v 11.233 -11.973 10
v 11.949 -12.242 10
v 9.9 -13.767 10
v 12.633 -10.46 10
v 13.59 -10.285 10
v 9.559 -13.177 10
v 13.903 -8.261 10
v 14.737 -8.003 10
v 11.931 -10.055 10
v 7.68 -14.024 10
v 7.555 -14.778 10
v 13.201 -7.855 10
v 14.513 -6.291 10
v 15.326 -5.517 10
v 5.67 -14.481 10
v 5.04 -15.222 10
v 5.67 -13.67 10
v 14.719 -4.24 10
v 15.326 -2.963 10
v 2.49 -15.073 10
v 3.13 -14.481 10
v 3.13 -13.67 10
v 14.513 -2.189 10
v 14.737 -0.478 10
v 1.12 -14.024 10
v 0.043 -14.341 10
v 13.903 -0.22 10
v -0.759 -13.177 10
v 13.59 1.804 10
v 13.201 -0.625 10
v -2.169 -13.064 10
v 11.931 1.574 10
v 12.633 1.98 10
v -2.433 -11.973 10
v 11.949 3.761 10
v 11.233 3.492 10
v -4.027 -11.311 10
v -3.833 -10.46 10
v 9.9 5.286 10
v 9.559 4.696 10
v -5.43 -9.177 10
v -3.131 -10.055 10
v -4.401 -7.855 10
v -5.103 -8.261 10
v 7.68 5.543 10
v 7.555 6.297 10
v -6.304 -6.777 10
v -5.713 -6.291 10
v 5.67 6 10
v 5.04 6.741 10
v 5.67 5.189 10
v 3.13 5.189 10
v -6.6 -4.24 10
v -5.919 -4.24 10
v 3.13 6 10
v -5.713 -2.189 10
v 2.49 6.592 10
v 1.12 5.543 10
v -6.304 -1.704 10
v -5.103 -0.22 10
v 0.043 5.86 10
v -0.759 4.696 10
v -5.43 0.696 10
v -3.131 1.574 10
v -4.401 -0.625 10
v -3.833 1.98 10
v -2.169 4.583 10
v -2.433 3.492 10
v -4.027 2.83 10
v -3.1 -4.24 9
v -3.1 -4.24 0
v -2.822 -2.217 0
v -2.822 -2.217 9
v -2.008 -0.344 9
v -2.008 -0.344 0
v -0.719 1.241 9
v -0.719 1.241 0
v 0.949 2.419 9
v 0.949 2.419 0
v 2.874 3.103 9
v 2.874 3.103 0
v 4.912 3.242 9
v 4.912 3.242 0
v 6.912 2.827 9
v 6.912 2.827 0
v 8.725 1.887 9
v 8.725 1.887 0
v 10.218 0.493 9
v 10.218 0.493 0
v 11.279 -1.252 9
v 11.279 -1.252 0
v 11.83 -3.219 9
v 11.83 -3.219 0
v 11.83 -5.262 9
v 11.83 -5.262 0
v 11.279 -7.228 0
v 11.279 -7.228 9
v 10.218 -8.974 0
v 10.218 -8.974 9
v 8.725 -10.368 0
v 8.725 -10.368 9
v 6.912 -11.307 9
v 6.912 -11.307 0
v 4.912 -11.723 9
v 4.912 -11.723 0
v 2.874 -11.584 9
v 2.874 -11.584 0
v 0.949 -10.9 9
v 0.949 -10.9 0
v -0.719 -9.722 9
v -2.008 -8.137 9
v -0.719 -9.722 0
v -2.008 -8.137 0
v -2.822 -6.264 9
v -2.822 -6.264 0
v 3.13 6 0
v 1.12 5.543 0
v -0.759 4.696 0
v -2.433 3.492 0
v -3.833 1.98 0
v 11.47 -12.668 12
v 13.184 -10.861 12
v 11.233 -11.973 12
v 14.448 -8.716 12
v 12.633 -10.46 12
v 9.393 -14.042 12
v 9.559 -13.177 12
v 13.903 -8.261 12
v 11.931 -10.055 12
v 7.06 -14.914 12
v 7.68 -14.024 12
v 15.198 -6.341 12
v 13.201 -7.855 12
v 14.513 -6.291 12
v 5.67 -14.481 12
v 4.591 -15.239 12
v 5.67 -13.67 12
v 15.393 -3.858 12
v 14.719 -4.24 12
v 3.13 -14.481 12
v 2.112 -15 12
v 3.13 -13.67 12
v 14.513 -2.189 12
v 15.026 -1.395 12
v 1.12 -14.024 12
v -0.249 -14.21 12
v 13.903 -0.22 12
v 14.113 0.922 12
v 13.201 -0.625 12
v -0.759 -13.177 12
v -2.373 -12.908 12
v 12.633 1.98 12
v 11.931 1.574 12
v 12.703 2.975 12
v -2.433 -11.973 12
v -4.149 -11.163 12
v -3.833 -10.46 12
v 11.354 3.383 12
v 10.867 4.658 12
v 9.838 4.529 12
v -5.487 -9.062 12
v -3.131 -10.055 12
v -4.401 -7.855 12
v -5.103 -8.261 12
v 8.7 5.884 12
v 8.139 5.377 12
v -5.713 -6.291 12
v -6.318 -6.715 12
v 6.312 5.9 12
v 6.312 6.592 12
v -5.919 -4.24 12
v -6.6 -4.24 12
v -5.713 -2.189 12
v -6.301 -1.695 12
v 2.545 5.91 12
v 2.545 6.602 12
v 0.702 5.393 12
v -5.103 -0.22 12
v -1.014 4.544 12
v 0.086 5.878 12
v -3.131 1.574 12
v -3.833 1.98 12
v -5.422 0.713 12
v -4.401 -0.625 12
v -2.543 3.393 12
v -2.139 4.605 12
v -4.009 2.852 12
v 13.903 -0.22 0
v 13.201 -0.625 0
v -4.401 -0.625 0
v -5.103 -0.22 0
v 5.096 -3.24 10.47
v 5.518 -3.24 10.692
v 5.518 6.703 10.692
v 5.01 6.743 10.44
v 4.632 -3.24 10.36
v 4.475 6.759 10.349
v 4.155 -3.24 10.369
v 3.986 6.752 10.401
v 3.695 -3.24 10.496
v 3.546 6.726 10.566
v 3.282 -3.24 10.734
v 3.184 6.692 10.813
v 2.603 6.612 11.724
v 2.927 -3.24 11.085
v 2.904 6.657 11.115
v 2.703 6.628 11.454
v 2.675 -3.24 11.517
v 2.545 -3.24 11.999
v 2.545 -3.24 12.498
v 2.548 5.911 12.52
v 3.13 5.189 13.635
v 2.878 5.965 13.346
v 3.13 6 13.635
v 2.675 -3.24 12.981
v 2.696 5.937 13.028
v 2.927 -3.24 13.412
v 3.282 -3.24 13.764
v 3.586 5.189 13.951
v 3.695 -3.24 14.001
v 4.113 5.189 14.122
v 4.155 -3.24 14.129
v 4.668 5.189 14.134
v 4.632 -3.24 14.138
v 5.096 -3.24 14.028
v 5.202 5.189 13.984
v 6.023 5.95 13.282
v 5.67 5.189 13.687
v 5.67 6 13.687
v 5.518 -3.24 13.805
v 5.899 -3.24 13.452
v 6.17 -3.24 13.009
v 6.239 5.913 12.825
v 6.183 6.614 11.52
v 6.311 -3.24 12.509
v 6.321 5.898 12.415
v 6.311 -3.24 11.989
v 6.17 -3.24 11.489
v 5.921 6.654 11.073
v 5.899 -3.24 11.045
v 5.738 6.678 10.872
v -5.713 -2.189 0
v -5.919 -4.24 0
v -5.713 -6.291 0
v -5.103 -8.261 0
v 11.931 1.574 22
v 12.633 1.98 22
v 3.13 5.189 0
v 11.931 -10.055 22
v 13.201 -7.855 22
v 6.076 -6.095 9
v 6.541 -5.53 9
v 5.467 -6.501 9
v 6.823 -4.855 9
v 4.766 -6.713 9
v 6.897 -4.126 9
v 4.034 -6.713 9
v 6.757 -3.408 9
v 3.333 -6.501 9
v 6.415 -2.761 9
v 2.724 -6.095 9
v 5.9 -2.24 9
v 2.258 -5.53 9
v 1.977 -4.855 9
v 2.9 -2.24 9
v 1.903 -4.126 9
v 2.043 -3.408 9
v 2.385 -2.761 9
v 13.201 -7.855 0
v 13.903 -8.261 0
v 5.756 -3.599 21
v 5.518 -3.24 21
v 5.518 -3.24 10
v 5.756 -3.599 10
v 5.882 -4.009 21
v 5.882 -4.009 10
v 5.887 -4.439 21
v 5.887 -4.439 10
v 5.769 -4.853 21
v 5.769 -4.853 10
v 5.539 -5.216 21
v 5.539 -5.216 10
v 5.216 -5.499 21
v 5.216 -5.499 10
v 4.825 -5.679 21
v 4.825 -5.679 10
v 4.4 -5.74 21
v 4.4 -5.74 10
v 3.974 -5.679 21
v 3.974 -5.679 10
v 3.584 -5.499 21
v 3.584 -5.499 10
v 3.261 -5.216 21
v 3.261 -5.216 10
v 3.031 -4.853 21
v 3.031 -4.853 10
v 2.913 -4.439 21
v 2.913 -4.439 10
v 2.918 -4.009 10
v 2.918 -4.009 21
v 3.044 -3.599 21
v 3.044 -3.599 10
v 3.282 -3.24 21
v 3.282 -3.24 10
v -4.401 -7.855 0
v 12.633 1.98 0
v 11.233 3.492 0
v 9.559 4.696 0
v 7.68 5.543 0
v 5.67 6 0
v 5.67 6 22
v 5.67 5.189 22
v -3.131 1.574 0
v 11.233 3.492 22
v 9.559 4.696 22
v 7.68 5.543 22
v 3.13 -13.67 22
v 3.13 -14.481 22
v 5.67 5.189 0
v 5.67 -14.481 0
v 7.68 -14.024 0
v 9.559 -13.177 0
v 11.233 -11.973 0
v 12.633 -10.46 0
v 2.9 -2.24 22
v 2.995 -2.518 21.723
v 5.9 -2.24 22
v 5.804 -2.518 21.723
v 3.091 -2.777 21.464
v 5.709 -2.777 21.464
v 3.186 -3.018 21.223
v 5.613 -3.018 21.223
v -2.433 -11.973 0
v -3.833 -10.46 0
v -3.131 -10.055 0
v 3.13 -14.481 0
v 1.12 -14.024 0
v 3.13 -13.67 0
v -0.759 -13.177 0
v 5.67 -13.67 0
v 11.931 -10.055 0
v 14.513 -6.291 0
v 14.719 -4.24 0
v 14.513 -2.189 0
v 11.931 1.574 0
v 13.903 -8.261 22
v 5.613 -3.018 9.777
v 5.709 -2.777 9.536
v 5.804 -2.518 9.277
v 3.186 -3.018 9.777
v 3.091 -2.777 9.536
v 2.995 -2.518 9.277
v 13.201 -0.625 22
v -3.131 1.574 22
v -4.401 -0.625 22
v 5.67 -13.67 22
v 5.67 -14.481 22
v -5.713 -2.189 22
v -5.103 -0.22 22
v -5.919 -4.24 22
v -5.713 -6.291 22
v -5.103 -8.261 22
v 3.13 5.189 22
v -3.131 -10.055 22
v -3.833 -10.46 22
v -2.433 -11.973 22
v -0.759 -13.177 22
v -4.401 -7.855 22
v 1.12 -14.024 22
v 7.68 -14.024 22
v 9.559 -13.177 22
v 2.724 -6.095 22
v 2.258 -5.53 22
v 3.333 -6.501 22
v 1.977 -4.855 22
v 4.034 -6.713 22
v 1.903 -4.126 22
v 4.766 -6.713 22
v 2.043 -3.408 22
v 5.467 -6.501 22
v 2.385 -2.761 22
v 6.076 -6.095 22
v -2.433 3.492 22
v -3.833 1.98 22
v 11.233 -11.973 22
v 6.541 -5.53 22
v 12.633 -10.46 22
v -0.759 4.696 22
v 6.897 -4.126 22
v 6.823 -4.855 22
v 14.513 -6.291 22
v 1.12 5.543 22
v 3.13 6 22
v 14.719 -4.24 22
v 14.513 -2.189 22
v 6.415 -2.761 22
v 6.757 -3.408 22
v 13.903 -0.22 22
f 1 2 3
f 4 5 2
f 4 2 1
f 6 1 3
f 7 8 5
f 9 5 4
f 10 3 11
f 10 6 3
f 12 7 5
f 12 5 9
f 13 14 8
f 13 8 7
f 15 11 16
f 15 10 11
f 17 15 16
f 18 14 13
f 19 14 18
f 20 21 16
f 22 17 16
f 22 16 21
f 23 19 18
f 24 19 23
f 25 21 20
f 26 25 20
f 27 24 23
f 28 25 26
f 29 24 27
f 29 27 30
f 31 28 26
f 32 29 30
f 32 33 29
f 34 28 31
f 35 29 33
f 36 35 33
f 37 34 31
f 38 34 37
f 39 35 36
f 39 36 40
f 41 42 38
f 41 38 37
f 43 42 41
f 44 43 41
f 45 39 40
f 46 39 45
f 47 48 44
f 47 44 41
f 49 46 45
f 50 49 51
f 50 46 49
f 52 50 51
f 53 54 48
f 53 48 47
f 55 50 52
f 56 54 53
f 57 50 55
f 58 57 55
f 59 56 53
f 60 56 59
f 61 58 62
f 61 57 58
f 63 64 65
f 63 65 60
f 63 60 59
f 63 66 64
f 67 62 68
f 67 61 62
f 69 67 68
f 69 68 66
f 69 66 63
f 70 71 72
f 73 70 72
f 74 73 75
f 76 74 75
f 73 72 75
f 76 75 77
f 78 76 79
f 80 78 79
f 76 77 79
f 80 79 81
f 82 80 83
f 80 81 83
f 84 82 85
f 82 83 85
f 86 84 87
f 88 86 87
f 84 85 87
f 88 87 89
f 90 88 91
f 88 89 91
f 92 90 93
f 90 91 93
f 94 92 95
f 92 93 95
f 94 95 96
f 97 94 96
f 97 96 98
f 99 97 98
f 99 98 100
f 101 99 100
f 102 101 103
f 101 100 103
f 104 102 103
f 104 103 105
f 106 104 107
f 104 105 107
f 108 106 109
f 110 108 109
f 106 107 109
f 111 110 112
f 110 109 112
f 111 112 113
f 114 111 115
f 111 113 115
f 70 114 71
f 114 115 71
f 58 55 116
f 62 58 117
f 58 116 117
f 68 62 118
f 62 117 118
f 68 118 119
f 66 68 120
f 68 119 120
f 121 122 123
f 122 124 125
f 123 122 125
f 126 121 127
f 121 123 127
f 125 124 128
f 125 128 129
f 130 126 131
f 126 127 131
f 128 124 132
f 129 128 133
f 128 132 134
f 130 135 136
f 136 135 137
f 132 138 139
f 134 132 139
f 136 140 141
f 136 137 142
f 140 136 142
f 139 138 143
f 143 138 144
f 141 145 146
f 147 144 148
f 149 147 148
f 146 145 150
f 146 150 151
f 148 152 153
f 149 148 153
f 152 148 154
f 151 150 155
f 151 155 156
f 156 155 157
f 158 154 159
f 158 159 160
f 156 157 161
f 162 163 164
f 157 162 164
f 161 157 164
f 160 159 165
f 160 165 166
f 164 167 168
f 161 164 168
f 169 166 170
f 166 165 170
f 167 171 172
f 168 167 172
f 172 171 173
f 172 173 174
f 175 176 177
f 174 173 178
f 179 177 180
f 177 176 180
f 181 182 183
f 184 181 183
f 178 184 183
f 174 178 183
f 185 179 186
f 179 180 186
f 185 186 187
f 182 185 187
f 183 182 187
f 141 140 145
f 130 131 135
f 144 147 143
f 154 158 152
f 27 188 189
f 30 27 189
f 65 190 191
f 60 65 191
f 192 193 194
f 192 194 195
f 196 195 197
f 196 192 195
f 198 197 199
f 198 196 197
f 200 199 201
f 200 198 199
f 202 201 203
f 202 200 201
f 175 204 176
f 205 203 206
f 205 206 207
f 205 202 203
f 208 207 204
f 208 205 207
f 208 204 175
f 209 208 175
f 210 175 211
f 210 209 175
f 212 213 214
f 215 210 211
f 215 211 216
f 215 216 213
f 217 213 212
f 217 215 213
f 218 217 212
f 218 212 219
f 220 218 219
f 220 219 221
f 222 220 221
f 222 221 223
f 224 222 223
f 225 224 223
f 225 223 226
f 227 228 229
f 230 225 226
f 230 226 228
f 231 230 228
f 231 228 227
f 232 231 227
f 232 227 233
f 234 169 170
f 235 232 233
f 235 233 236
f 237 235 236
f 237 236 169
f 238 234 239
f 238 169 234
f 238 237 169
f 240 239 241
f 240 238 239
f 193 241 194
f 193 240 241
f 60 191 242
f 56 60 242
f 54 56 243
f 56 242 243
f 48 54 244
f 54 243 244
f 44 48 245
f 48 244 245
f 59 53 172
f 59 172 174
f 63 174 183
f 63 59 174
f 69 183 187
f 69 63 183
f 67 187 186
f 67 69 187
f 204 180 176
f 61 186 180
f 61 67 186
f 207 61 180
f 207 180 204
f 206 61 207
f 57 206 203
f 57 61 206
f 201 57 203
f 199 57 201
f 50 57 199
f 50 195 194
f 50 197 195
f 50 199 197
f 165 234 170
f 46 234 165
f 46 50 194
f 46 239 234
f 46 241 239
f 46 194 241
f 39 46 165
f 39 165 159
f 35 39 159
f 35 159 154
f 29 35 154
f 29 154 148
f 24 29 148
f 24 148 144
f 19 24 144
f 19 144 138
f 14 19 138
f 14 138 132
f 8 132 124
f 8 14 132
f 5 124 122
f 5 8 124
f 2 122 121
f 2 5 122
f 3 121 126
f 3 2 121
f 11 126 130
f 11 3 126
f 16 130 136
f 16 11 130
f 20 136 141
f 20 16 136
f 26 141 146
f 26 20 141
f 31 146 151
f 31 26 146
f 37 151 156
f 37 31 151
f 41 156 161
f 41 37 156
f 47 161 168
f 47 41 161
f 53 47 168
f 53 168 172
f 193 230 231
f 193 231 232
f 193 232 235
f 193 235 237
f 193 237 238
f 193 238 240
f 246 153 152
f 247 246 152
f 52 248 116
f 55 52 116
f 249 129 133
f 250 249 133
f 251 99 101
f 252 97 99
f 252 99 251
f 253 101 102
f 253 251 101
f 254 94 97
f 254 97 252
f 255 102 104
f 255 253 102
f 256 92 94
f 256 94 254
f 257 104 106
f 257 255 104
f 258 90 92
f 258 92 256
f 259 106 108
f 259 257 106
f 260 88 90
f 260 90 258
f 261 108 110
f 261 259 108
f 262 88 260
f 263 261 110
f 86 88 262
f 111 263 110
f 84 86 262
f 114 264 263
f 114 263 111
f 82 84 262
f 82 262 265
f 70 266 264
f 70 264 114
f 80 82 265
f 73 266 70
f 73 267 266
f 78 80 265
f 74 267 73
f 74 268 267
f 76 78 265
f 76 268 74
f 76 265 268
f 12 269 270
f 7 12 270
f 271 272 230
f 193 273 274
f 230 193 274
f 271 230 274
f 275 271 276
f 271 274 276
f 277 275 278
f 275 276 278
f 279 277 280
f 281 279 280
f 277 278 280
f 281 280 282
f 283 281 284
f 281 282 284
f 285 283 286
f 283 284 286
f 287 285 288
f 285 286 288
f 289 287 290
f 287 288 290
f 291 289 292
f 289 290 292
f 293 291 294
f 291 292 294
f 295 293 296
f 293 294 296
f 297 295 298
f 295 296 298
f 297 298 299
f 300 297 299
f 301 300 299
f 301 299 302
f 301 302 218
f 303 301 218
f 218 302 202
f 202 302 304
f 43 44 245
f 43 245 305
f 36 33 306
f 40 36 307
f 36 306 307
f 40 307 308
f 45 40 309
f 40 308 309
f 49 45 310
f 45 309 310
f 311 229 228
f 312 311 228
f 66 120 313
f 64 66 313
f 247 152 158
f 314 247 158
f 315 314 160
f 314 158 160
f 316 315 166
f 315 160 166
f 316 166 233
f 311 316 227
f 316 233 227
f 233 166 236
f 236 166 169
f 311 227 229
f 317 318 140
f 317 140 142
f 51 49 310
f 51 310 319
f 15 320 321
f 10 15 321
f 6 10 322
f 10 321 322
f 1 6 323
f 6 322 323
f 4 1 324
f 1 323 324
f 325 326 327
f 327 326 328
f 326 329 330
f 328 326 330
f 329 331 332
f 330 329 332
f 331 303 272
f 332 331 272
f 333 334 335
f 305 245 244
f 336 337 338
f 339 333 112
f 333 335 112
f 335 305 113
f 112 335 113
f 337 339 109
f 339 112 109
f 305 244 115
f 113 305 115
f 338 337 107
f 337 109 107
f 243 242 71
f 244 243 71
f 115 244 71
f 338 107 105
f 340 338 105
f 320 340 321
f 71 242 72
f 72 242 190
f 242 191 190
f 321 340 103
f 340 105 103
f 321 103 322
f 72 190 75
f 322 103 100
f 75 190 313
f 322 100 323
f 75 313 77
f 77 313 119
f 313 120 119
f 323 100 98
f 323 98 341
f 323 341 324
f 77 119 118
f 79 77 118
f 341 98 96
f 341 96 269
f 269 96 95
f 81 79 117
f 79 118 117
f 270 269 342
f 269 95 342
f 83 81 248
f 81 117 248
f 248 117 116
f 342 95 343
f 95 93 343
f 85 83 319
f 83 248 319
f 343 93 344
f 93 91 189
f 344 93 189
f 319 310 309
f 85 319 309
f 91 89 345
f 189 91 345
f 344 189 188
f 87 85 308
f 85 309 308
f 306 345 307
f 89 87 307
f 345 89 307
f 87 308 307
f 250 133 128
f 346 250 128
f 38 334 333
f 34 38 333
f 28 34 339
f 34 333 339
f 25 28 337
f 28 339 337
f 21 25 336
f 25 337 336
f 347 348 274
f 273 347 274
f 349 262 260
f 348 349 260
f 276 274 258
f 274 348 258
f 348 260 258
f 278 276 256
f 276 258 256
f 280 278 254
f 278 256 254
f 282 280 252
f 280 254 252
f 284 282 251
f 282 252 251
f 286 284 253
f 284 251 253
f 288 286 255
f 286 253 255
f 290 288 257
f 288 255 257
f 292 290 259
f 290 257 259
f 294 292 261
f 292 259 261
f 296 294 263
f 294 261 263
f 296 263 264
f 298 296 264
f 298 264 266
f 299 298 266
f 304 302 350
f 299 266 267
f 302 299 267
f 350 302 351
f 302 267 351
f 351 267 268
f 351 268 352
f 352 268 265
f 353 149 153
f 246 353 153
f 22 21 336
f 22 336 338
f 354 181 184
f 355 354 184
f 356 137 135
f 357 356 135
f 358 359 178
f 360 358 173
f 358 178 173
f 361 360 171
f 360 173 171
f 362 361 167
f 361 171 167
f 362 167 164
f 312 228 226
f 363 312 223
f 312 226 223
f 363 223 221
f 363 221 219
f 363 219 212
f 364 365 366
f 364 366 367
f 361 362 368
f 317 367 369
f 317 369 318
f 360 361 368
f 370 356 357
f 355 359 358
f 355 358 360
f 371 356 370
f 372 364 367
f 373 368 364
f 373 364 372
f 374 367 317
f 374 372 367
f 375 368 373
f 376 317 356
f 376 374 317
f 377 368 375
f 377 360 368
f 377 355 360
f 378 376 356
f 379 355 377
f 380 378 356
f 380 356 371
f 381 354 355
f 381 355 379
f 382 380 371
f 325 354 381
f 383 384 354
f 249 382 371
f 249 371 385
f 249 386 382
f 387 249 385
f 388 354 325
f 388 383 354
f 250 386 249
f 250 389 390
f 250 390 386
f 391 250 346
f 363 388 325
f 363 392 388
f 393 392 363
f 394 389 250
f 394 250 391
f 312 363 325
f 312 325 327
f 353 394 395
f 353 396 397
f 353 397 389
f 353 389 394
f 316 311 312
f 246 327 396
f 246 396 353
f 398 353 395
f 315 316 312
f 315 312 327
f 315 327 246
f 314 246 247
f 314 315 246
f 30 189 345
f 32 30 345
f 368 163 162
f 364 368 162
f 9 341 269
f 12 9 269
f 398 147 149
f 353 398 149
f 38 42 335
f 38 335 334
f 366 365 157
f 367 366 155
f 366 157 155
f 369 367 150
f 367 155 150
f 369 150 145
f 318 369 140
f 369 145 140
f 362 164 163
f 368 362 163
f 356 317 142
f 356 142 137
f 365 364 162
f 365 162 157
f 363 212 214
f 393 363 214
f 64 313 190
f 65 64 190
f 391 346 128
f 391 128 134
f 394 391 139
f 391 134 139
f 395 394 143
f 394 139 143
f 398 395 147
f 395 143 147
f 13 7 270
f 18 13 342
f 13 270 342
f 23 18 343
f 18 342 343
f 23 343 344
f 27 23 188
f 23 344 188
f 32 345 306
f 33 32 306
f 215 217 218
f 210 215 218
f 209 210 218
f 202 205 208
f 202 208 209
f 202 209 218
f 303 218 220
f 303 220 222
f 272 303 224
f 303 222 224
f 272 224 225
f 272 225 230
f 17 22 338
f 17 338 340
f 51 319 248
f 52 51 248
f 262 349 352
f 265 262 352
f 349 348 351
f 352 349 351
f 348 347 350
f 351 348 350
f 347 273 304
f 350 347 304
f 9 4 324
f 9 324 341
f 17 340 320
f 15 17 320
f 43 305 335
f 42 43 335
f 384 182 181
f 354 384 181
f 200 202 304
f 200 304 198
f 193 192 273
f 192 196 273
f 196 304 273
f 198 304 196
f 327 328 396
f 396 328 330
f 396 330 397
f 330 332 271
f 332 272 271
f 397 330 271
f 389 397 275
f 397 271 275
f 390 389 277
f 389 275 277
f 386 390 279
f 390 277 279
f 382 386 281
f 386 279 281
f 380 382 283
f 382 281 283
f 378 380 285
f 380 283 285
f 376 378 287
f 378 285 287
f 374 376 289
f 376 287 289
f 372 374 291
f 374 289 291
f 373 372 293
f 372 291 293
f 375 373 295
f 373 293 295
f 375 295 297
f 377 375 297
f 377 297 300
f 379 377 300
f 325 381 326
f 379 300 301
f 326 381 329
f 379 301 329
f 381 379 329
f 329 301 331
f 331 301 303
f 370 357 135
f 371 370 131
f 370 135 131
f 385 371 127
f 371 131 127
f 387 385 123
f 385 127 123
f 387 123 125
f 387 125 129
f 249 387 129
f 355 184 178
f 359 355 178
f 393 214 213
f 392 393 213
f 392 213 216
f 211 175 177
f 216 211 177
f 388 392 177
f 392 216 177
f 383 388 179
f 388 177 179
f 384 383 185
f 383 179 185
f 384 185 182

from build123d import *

# Parameters (mm, degrees)
EXTRUDE_1_DEPTH          = 22
SKETCH_2_R               = 7.5
CUT_EXTRUDE_1_DEPTH      = 9
CUT_EXTRUDE_3_DEPTH      = 1
CUT_EXTRUDE_3_DEPTH_BACK = 8.42975
SKETCH_4_R               = 1.9
CHAMFER_1_SIZE           = 1
EXTRUDE_START            = -10
SKETCH_5_R               = 11
SKETCH_5_R_2             = 9.429749991
EXTRUDE_2_DEPTH          = 2
CUT_EXTRUDE_4_DEPTH      = 2
CUT_EXTRUDE_4_DEPTH_BACK = 2
SKETCH_6_R               = 1.9


with BuildPart() as part:
    # Эскиз1 → Бобышка-Вытянуть1 (new body)
    with BuildSketch(Plane.XY):
        with BuildLine():
            Line((13.201310027, -7.85542296), (13.90326512, -8.260696921))
            ThreePointArc((13.90326512, -8.260696921), (14.718656981, -4.240400213), (13.903265122, -0.220103504))
            Line((13.903265122, -0.220103504), (13.201310027, -0.625377467))
            Line((13.201310027, -0.625377467), (11.931310033, 1.574327047))
            Line((11.931310033, 1.574327047), (12.633265127, 1.979601009))
            ThreePointArc((12.633265127, 1.979601009), (9.559281984, 4.695899416), (5.669906988, 5.999897702))
            Line((5.669906988, 5.999897702), (5.669906988, 5.189349779))
            Line((5.669906988, 5.189349779), (3.129906988, 5.189349779))
            Line((3.129906988, 5.189349779), (3.129906988, 5.999897708))
            ThreePointArc((3.129906988, 5.999897708), (-0.759468012, 4.69589942), (-3.833451156, 1.979601011))
            Line((-3.833451156, 1.979601011), (-3.131496059, 1.574327046))
            Line((-3.131496059, 1.574327046), (-4.401496055, -0.625377472))
            Line((-4.401496055, -0.625377472), (-5.103451147, -0.22010351))
            ThreePointArc((-5.103451147, -0.22010351), (-5.918843009, -4.240400218), (-5.10345115, -8.260696926))
            Line((-5.10345115, -8.260696926), (-4.401496056, -7.855422963))
            Line((-4.401496056, -7.855422963), (-3.13149606, -10.055127481))
            Line((-3.13149606, -10.055127481), (-3.833451154, -10.460401444))
            ThreePointArc((-3.833451154, -10.460401444), (-0.759468012, -13.17669985), (3.129906983, -14.480698136))
            Line((3.129906983, -14.480698136), (3.129906983, -13.670150213))
            Line((3.129906983, -13.670150213), (5.669906983, -13.670150213))
            Line((5.669906983, -13.670150213), (5.669906983, -14.480698142))
            ThreePointArc((5.669906983, -14.480698142), (9.559281984, -13.176699854), (12.633265129, -10.460401443))
            Line((12.633265129, -10.460401443), (11.931310031, -10.055127478))
            Line((11.931310031, -10.055127478), (13.201310027, -7.85542296))
        make_face()
        with BuildLine():
            Line((3.281873001, -3.240400222), (5.517940979, -3.240400222))
            ThreePointArc((5.517940979, -3.240400222), (4.39990699, -5.740400222), (3.281873001, -3.240400222))
        make_face(mode=Mode.SUBTRACT)
    extrude(amount=EXTRUDE_1_DEPTH)

    # Эскиз2 → Вырез-Вытянуть1 (cut)
    with BuildSketch(Plane(origin=(0, 0, 0), x_dir=(-1, 0, 0), z_dir=(0, 0, -1))):
        with Locations((-4.39990699, -4.240400222)):
            Circle(SKETCH_2_R)
    extrude(amount=-CUT_EXTRUDE_1_DEPTH, mode=Mode.SUBTRACT)

    # Эскиз4 → Вырез-Вытянуть3 (cut, two sides: drawn at the far end of the back side and taken through both)
    with BuildSketch(Plane(origin=(0, 5.189349779, 0), x_dir=(1, 0, 0), z_dir=(0, 1, 0)).offset(-CUT_EXTRUDE_3_DEPTH_BACK)):
        with Locations(Location((4.428692677, -12.248697559, 0), (0, 0, 55.020131728))):
            Circle(SKETCH_4_R)
    extrude(amount=CUT_EXTRUDE_3_DEPTH + CUT_EXTRUDE_3_DEPTH_BACK, mode=Mode.SUBTRACT)

    # Фаска1
    chamfer_1_edges = [part.edges().sort_by_distance(p)[0] for p in [
        (4.39990699, -5.740400222, 22),
        (4.39990699, -3.240400222, 22),
        (4.39990699, -3.240400222, 9),
        (4.39990699, -5.740400222, 9),
    ]]
    chamfer(chamfer_1_edges, length=CHAMFER_1_SIZE)

    # Эскиз5 → Бобышка-Вытянуть2 (add)
    with BuildSketch(Plane(origin=(0, 0, 0), x_dir=(-1, 0, 0), z_dir=(0, 0, -1)).offset(EXTRUDE_START)):
        with Locations((-4.39990699, -4.240400222)):
            Circle(SKETCH_5_R)
        with Locations((-4.39990699, -4.240400222)):
            Circle(SKETCH_5_R_2, mode=Mode.SUBTRACT)
    extrude(amount=-EXTRUDE_2_DEPTH)

    # Эскиз6 → Вырез-Вытянуть4 (cut, two sides: drawn at the far end of the back side and taken through both)
    with BuildSketch(Plane(origin=(0, 5.189349779, 0), x_dir=(1, 0, 0), z_dir=(0, 1, 0)).offset(-CUT_EXTRUDE_4_DEPTH_BACK)):
        with Locations(Location((4.428692677, -12.248697559, 0), (0, 0, 55.020131728))):
            Circle(SKETCH_6_R)
    extrude(amount=CUT_EXTRUDE_4_DEPTH + CUT_EXTRUDE_4_DEPTH_BACK, mode=Mode.SUBTRACT)


solid = part.part
